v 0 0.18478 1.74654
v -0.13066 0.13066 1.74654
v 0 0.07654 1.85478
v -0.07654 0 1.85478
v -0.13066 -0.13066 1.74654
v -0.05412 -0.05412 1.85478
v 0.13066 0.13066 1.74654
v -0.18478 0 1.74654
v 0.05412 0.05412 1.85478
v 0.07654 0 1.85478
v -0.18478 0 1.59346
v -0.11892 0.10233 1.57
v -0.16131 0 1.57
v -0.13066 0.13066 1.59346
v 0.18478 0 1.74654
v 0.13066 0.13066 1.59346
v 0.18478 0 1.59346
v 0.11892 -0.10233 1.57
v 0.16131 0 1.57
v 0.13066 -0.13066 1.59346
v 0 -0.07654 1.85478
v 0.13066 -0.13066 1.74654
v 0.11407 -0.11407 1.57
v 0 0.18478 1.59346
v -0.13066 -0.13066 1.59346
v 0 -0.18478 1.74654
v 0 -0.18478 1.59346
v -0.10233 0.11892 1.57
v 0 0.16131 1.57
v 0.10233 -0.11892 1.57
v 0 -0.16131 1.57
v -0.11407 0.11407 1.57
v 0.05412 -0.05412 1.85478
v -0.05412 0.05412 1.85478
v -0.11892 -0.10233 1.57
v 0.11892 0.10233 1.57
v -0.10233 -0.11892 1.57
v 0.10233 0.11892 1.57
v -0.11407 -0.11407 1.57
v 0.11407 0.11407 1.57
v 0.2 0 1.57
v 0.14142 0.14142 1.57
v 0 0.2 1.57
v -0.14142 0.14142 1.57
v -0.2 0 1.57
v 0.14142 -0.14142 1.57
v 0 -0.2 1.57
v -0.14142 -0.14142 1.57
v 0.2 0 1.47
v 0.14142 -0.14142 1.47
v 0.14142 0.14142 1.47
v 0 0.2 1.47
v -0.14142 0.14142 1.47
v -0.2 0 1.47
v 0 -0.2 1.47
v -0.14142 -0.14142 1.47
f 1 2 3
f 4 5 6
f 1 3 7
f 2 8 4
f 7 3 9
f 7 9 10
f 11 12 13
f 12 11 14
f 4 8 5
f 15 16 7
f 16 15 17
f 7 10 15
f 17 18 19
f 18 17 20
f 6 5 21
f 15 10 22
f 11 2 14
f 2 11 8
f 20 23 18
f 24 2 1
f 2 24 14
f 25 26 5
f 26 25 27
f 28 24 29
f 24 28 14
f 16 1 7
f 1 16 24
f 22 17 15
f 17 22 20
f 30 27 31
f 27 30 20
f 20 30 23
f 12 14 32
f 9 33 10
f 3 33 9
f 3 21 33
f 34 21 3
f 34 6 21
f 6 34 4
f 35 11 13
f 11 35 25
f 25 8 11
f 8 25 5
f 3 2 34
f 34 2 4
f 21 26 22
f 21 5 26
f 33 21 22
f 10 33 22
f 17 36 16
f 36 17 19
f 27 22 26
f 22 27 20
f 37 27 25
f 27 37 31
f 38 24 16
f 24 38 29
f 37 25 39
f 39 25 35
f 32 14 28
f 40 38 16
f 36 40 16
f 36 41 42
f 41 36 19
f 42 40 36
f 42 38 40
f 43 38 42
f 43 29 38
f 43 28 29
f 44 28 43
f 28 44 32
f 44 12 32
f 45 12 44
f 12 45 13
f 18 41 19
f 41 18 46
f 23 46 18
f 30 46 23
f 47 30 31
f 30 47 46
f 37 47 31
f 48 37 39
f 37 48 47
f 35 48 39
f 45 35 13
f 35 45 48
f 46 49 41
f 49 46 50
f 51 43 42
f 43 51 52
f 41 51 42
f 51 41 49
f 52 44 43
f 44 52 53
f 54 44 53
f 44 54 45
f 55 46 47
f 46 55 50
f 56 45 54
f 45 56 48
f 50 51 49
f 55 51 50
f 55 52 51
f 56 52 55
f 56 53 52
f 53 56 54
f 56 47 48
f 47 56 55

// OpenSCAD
// file: lib.scad
function x(v) = v[0];
function y(v) = v[1];
function z(v) = v[2];
function add(v1,v2) = [ for (i = [ 0 : len(v1)-1 ]) v1[i] + v2[i] ];
function xv(d) = [d,0,0];
function yv(d) = [0,d,0];
function zv(d) = [0,0,d];

module box(v) { cube(size=v, center=true); }
module cyl(r1,r2,h) { cylinder(r1=r1, r2=r2, h=h, center=true); }

function grow(n,v) = [x(v)+n*2, y(v)+n*2, z(v)+n*2];

module rbox(v, radius=1) {
	cx = x(v)/2-radius;
	cy = y(v)/2-radius;
	cz = z(v)/2-radius;

	hull() {
		translate([cx,cy,cz]) sphere(r=radius);
		translate([cx,cy,-cz]) sphere(r=radius);
		translate([cx,-cy,cz]) sphere(r=radius);
		translate([cx,-cy,-cz]) sphere(r=radius);
		translate([-cx,cy,cz]) sphere(r=radius);
		translate([-cx,cy,-cz]) sphere(r=radius);
		translate([-cx,-cy,cz]) sphere(r=radius);
		translate([-cx,-cy,-cz]) sphere(r=radius);
	}
}

module fillet(r=1) {
  minkowski() {
    difference() {
      children();
      minkowski() {
        difference() {
          minkowski() {
            children();
            sphere(r=r);
          }
          children();
        }
        sphere(r=r);
      }
    }
    sphere(r=r);
  }
}
// main file
use <lib.scad>

module base() {
	translate([0,0,0.1]) cyl(0.45, 0.45, 0.2);
}

module pillar() {
	translate([0,-0.30,0.9]) rbox([0.32,0.2,1.8],0.01,$fn=$fn/4);
}

module telescope1() {
	#translate([0,0,1.625]) rotate([90,0,0]) cyl(0.15, 0.15, 0.5);
}

module telescope2() {
	#translate([0,0,1.625]) rotate([90,0,0]) cyl(0.125, 0.125, 0.5);
}

module telescope3() {
	#translate([0,0,1.625]) rotate([90,0,0]) cyl(0.10, 0.10, 0.5);
}

module telescope4() {
	#translate([0,0,1.625]) rotate([90,0,0]) cyl(0.075, 0.075, 0.5);
}

module telescope5() {
	#translate([0,0,1.625]) rotate([90,0,0]) cyl(0.05, 0.05, 0.5);
}

module grip() {
	union() {
		translate([0,0,1.67]) sphere(0.2);
		translate([0,0,1.52]) cyl(0.2, 0.2, 0.1);
	}
}

d = 8;

//base($fn=d);
//pillar($fn=d);
//telescope1($fn=d);
//telescope2($fn=d);
//telescope3($fn=d);
//telescope4($fn=d);
//telescope5($fn=d);
grip($fn=d);
